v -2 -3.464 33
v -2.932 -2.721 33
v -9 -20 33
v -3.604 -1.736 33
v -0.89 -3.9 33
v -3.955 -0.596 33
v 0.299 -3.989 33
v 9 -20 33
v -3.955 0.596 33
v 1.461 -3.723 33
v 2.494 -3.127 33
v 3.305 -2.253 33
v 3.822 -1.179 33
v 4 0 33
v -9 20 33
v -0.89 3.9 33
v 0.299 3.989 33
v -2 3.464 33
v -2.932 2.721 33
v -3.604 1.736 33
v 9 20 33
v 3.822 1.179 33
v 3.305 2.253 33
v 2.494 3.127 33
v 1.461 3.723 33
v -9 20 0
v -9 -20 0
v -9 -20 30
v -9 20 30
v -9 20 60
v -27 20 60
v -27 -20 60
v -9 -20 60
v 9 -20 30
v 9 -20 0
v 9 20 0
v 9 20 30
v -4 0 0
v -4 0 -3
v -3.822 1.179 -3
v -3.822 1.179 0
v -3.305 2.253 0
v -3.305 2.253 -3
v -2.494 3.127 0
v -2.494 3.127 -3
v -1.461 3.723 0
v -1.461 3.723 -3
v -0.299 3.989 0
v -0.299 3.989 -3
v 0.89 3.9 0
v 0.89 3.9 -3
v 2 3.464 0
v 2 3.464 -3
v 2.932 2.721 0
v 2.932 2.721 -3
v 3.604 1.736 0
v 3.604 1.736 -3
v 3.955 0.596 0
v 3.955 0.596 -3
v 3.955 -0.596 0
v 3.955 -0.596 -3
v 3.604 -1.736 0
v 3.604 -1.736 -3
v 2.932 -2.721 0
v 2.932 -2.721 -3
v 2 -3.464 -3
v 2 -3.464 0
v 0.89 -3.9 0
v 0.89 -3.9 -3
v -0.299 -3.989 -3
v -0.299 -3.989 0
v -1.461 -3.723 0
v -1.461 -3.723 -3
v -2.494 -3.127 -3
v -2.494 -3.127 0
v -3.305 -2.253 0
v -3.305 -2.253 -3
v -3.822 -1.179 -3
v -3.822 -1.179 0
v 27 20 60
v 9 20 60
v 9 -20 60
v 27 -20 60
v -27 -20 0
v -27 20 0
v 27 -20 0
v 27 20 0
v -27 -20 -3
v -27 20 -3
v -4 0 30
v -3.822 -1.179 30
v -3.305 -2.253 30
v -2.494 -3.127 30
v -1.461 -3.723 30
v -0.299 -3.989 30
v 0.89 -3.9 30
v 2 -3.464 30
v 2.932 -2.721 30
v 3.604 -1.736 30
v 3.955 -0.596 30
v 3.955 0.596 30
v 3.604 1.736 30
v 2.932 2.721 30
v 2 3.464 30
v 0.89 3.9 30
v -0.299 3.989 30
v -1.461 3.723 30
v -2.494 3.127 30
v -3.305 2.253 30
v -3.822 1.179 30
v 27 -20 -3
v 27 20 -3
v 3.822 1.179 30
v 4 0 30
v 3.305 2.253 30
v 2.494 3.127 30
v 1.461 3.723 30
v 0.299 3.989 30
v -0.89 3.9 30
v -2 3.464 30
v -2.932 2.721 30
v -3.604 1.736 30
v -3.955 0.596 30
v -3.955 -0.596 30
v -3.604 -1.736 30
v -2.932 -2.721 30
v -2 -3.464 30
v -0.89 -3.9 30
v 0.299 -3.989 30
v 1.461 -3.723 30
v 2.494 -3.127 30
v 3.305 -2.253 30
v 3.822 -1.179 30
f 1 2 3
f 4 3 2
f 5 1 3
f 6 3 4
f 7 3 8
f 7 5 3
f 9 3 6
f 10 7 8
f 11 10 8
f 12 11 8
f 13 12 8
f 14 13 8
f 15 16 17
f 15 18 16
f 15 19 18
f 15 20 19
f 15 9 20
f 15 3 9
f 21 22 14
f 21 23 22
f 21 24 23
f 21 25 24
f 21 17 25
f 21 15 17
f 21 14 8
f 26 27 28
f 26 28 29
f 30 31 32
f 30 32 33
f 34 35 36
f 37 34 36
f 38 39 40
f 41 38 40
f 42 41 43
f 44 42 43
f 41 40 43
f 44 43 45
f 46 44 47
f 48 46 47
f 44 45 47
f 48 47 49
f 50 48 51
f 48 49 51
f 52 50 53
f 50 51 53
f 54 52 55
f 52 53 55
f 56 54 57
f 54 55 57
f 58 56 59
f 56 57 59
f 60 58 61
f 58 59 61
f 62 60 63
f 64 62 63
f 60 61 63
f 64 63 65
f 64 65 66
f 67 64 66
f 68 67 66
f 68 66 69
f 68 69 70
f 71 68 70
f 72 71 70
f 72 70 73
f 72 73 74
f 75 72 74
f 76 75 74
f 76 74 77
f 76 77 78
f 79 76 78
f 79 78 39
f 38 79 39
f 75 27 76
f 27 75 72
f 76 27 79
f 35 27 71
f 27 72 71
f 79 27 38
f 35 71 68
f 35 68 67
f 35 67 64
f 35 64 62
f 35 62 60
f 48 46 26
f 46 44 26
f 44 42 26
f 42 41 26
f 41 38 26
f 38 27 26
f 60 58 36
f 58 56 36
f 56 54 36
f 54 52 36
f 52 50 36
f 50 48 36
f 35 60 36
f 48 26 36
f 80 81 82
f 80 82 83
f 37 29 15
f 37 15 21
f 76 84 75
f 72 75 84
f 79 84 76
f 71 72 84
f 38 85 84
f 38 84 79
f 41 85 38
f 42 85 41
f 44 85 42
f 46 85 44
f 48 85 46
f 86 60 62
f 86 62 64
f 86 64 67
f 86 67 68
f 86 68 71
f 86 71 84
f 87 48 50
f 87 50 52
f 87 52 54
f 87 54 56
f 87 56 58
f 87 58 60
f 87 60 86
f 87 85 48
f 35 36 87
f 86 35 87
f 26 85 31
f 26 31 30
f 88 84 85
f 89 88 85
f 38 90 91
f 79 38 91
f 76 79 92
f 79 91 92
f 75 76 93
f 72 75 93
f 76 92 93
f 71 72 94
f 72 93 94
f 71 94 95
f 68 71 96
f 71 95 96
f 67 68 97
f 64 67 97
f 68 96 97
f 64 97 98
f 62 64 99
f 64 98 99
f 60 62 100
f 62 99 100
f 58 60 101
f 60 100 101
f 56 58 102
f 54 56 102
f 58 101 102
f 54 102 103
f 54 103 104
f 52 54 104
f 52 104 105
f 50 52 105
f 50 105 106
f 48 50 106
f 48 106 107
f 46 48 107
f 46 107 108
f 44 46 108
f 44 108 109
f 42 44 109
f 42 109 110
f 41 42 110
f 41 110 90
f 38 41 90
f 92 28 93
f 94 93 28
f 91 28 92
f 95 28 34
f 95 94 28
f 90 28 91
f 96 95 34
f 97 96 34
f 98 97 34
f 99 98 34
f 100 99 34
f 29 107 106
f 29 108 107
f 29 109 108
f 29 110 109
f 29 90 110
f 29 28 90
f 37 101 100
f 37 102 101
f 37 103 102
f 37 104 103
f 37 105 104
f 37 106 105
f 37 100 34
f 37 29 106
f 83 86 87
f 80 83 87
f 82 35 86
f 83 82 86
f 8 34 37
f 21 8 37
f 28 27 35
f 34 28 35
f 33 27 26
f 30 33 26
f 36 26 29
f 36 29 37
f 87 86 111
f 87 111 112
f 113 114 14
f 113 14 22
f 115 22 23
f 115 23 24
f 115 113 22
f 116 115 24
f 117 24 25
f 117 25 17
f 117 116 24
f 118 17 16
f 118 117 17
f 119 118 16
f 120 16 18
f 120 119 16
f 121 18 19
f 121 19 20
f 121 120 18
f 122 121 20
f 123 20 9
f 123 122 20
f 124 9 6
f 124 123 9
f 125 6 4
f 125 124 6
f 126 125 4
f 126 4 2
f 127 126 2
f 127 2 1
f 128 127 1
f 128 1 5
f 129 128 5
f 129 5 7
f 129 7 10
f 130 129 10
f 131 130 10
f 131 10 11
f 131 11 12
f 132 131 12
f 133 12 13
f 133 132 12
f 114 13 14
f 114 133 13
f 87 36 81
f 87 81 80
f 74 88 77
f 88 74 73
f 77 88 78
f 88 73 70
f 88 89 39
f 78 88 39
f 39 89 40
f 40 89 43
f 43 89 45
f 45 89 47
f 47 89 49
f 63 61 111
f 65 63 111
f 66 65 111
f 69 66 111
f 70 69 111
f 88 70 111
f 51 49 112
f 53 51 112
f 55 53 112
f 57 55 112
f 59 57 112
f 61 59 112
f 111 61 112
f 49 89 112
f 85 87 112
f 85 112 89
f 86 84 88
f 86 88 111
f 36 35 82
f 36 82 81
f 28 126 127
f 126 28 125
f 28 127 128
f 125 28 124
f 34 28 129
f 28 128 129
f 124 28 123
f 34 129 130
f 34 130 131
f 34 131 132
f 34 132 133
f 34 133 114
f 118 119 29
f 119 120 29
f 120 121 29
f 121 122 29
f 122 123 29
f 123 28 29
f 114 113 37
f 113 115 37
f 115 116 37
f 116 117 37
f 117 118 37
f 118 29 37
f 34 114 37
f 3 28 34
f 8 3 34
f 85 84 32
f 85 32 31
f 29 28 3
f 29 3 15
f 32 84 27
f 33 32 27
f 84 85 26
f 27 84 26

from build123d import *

# Parameters (mm, degrees)
F0_W     = 18
F0_H     = 40
F1_DEPTH = 60
F2_DEPTH = 30
F3_D     = 8
F4_DEPTH = 3
F5_D     = 8
F6_W     = 18
F6_H     = 40
F6_R     = 4
F7_DEPTH = 3


with BuildPart() as f1:
    # F0 (on Top) → F1 (new body)
    with BuildSketch(Plane.XY):
        with Locations((-18, 0)):
            Rectangle(F0_W, F0_H)
    extrude(amount=F1_DEPTH)


with BuildPart() as f1b:
    # F0 (on Top) → F1, piece 2 (new body)
    with BuildSketch(Plane.XY):
        with Locations((18, 0)):
            Rectangle(F0_W, F0_H)
    extrude(amount=F1_DEPTH)


with BuildPart() as f2:
    # F0 (on Top) → F2 (new body)
    with BuildSketch(Plane.XY):
        Rectangle(F0_W, F0_H)
    extrude(amount=F2_DEPTH)

    # F3 (through all)
    with Locations(Plane(origin=(0, 0, 0), x_dir=(1, 0, 0), z_dir=(0, 0, -1))):
        with Locations((0, 0)):
            Hole(F3_D / 2)


with BuildPart() as f4:
    # F0 (on Top) → F4 (new body)
    with BuildSketch(Plane.XY):
        with Locations((-18, 0)):
            Rectangle(F0_W, F0_H)
        Rectangle(F0_W, F0_H)
        with Locations((18, 0)):
            Rectangle(F0_W, F0_H)
    extrude(amount=-F4_DEPTH)

    # F5 (through all)
    with Locations(Plane.XY):
        with Locations((0, 0)):
            Hole(F5_D / 2)


with BuildPart() as f7:
    # F6 (on face) → F7 (new body)
    with BuildSketch(Plane.XY.offset(30)):
        Rectangle(F6_W, F6_H)
        Circle(F6_R, mode=Mode.SUBTRACT)
    extrude(amount=F7_DEPTH)


solid = Compound([f1.part, f1b.part, f2.part, f4.part, f7.part])
